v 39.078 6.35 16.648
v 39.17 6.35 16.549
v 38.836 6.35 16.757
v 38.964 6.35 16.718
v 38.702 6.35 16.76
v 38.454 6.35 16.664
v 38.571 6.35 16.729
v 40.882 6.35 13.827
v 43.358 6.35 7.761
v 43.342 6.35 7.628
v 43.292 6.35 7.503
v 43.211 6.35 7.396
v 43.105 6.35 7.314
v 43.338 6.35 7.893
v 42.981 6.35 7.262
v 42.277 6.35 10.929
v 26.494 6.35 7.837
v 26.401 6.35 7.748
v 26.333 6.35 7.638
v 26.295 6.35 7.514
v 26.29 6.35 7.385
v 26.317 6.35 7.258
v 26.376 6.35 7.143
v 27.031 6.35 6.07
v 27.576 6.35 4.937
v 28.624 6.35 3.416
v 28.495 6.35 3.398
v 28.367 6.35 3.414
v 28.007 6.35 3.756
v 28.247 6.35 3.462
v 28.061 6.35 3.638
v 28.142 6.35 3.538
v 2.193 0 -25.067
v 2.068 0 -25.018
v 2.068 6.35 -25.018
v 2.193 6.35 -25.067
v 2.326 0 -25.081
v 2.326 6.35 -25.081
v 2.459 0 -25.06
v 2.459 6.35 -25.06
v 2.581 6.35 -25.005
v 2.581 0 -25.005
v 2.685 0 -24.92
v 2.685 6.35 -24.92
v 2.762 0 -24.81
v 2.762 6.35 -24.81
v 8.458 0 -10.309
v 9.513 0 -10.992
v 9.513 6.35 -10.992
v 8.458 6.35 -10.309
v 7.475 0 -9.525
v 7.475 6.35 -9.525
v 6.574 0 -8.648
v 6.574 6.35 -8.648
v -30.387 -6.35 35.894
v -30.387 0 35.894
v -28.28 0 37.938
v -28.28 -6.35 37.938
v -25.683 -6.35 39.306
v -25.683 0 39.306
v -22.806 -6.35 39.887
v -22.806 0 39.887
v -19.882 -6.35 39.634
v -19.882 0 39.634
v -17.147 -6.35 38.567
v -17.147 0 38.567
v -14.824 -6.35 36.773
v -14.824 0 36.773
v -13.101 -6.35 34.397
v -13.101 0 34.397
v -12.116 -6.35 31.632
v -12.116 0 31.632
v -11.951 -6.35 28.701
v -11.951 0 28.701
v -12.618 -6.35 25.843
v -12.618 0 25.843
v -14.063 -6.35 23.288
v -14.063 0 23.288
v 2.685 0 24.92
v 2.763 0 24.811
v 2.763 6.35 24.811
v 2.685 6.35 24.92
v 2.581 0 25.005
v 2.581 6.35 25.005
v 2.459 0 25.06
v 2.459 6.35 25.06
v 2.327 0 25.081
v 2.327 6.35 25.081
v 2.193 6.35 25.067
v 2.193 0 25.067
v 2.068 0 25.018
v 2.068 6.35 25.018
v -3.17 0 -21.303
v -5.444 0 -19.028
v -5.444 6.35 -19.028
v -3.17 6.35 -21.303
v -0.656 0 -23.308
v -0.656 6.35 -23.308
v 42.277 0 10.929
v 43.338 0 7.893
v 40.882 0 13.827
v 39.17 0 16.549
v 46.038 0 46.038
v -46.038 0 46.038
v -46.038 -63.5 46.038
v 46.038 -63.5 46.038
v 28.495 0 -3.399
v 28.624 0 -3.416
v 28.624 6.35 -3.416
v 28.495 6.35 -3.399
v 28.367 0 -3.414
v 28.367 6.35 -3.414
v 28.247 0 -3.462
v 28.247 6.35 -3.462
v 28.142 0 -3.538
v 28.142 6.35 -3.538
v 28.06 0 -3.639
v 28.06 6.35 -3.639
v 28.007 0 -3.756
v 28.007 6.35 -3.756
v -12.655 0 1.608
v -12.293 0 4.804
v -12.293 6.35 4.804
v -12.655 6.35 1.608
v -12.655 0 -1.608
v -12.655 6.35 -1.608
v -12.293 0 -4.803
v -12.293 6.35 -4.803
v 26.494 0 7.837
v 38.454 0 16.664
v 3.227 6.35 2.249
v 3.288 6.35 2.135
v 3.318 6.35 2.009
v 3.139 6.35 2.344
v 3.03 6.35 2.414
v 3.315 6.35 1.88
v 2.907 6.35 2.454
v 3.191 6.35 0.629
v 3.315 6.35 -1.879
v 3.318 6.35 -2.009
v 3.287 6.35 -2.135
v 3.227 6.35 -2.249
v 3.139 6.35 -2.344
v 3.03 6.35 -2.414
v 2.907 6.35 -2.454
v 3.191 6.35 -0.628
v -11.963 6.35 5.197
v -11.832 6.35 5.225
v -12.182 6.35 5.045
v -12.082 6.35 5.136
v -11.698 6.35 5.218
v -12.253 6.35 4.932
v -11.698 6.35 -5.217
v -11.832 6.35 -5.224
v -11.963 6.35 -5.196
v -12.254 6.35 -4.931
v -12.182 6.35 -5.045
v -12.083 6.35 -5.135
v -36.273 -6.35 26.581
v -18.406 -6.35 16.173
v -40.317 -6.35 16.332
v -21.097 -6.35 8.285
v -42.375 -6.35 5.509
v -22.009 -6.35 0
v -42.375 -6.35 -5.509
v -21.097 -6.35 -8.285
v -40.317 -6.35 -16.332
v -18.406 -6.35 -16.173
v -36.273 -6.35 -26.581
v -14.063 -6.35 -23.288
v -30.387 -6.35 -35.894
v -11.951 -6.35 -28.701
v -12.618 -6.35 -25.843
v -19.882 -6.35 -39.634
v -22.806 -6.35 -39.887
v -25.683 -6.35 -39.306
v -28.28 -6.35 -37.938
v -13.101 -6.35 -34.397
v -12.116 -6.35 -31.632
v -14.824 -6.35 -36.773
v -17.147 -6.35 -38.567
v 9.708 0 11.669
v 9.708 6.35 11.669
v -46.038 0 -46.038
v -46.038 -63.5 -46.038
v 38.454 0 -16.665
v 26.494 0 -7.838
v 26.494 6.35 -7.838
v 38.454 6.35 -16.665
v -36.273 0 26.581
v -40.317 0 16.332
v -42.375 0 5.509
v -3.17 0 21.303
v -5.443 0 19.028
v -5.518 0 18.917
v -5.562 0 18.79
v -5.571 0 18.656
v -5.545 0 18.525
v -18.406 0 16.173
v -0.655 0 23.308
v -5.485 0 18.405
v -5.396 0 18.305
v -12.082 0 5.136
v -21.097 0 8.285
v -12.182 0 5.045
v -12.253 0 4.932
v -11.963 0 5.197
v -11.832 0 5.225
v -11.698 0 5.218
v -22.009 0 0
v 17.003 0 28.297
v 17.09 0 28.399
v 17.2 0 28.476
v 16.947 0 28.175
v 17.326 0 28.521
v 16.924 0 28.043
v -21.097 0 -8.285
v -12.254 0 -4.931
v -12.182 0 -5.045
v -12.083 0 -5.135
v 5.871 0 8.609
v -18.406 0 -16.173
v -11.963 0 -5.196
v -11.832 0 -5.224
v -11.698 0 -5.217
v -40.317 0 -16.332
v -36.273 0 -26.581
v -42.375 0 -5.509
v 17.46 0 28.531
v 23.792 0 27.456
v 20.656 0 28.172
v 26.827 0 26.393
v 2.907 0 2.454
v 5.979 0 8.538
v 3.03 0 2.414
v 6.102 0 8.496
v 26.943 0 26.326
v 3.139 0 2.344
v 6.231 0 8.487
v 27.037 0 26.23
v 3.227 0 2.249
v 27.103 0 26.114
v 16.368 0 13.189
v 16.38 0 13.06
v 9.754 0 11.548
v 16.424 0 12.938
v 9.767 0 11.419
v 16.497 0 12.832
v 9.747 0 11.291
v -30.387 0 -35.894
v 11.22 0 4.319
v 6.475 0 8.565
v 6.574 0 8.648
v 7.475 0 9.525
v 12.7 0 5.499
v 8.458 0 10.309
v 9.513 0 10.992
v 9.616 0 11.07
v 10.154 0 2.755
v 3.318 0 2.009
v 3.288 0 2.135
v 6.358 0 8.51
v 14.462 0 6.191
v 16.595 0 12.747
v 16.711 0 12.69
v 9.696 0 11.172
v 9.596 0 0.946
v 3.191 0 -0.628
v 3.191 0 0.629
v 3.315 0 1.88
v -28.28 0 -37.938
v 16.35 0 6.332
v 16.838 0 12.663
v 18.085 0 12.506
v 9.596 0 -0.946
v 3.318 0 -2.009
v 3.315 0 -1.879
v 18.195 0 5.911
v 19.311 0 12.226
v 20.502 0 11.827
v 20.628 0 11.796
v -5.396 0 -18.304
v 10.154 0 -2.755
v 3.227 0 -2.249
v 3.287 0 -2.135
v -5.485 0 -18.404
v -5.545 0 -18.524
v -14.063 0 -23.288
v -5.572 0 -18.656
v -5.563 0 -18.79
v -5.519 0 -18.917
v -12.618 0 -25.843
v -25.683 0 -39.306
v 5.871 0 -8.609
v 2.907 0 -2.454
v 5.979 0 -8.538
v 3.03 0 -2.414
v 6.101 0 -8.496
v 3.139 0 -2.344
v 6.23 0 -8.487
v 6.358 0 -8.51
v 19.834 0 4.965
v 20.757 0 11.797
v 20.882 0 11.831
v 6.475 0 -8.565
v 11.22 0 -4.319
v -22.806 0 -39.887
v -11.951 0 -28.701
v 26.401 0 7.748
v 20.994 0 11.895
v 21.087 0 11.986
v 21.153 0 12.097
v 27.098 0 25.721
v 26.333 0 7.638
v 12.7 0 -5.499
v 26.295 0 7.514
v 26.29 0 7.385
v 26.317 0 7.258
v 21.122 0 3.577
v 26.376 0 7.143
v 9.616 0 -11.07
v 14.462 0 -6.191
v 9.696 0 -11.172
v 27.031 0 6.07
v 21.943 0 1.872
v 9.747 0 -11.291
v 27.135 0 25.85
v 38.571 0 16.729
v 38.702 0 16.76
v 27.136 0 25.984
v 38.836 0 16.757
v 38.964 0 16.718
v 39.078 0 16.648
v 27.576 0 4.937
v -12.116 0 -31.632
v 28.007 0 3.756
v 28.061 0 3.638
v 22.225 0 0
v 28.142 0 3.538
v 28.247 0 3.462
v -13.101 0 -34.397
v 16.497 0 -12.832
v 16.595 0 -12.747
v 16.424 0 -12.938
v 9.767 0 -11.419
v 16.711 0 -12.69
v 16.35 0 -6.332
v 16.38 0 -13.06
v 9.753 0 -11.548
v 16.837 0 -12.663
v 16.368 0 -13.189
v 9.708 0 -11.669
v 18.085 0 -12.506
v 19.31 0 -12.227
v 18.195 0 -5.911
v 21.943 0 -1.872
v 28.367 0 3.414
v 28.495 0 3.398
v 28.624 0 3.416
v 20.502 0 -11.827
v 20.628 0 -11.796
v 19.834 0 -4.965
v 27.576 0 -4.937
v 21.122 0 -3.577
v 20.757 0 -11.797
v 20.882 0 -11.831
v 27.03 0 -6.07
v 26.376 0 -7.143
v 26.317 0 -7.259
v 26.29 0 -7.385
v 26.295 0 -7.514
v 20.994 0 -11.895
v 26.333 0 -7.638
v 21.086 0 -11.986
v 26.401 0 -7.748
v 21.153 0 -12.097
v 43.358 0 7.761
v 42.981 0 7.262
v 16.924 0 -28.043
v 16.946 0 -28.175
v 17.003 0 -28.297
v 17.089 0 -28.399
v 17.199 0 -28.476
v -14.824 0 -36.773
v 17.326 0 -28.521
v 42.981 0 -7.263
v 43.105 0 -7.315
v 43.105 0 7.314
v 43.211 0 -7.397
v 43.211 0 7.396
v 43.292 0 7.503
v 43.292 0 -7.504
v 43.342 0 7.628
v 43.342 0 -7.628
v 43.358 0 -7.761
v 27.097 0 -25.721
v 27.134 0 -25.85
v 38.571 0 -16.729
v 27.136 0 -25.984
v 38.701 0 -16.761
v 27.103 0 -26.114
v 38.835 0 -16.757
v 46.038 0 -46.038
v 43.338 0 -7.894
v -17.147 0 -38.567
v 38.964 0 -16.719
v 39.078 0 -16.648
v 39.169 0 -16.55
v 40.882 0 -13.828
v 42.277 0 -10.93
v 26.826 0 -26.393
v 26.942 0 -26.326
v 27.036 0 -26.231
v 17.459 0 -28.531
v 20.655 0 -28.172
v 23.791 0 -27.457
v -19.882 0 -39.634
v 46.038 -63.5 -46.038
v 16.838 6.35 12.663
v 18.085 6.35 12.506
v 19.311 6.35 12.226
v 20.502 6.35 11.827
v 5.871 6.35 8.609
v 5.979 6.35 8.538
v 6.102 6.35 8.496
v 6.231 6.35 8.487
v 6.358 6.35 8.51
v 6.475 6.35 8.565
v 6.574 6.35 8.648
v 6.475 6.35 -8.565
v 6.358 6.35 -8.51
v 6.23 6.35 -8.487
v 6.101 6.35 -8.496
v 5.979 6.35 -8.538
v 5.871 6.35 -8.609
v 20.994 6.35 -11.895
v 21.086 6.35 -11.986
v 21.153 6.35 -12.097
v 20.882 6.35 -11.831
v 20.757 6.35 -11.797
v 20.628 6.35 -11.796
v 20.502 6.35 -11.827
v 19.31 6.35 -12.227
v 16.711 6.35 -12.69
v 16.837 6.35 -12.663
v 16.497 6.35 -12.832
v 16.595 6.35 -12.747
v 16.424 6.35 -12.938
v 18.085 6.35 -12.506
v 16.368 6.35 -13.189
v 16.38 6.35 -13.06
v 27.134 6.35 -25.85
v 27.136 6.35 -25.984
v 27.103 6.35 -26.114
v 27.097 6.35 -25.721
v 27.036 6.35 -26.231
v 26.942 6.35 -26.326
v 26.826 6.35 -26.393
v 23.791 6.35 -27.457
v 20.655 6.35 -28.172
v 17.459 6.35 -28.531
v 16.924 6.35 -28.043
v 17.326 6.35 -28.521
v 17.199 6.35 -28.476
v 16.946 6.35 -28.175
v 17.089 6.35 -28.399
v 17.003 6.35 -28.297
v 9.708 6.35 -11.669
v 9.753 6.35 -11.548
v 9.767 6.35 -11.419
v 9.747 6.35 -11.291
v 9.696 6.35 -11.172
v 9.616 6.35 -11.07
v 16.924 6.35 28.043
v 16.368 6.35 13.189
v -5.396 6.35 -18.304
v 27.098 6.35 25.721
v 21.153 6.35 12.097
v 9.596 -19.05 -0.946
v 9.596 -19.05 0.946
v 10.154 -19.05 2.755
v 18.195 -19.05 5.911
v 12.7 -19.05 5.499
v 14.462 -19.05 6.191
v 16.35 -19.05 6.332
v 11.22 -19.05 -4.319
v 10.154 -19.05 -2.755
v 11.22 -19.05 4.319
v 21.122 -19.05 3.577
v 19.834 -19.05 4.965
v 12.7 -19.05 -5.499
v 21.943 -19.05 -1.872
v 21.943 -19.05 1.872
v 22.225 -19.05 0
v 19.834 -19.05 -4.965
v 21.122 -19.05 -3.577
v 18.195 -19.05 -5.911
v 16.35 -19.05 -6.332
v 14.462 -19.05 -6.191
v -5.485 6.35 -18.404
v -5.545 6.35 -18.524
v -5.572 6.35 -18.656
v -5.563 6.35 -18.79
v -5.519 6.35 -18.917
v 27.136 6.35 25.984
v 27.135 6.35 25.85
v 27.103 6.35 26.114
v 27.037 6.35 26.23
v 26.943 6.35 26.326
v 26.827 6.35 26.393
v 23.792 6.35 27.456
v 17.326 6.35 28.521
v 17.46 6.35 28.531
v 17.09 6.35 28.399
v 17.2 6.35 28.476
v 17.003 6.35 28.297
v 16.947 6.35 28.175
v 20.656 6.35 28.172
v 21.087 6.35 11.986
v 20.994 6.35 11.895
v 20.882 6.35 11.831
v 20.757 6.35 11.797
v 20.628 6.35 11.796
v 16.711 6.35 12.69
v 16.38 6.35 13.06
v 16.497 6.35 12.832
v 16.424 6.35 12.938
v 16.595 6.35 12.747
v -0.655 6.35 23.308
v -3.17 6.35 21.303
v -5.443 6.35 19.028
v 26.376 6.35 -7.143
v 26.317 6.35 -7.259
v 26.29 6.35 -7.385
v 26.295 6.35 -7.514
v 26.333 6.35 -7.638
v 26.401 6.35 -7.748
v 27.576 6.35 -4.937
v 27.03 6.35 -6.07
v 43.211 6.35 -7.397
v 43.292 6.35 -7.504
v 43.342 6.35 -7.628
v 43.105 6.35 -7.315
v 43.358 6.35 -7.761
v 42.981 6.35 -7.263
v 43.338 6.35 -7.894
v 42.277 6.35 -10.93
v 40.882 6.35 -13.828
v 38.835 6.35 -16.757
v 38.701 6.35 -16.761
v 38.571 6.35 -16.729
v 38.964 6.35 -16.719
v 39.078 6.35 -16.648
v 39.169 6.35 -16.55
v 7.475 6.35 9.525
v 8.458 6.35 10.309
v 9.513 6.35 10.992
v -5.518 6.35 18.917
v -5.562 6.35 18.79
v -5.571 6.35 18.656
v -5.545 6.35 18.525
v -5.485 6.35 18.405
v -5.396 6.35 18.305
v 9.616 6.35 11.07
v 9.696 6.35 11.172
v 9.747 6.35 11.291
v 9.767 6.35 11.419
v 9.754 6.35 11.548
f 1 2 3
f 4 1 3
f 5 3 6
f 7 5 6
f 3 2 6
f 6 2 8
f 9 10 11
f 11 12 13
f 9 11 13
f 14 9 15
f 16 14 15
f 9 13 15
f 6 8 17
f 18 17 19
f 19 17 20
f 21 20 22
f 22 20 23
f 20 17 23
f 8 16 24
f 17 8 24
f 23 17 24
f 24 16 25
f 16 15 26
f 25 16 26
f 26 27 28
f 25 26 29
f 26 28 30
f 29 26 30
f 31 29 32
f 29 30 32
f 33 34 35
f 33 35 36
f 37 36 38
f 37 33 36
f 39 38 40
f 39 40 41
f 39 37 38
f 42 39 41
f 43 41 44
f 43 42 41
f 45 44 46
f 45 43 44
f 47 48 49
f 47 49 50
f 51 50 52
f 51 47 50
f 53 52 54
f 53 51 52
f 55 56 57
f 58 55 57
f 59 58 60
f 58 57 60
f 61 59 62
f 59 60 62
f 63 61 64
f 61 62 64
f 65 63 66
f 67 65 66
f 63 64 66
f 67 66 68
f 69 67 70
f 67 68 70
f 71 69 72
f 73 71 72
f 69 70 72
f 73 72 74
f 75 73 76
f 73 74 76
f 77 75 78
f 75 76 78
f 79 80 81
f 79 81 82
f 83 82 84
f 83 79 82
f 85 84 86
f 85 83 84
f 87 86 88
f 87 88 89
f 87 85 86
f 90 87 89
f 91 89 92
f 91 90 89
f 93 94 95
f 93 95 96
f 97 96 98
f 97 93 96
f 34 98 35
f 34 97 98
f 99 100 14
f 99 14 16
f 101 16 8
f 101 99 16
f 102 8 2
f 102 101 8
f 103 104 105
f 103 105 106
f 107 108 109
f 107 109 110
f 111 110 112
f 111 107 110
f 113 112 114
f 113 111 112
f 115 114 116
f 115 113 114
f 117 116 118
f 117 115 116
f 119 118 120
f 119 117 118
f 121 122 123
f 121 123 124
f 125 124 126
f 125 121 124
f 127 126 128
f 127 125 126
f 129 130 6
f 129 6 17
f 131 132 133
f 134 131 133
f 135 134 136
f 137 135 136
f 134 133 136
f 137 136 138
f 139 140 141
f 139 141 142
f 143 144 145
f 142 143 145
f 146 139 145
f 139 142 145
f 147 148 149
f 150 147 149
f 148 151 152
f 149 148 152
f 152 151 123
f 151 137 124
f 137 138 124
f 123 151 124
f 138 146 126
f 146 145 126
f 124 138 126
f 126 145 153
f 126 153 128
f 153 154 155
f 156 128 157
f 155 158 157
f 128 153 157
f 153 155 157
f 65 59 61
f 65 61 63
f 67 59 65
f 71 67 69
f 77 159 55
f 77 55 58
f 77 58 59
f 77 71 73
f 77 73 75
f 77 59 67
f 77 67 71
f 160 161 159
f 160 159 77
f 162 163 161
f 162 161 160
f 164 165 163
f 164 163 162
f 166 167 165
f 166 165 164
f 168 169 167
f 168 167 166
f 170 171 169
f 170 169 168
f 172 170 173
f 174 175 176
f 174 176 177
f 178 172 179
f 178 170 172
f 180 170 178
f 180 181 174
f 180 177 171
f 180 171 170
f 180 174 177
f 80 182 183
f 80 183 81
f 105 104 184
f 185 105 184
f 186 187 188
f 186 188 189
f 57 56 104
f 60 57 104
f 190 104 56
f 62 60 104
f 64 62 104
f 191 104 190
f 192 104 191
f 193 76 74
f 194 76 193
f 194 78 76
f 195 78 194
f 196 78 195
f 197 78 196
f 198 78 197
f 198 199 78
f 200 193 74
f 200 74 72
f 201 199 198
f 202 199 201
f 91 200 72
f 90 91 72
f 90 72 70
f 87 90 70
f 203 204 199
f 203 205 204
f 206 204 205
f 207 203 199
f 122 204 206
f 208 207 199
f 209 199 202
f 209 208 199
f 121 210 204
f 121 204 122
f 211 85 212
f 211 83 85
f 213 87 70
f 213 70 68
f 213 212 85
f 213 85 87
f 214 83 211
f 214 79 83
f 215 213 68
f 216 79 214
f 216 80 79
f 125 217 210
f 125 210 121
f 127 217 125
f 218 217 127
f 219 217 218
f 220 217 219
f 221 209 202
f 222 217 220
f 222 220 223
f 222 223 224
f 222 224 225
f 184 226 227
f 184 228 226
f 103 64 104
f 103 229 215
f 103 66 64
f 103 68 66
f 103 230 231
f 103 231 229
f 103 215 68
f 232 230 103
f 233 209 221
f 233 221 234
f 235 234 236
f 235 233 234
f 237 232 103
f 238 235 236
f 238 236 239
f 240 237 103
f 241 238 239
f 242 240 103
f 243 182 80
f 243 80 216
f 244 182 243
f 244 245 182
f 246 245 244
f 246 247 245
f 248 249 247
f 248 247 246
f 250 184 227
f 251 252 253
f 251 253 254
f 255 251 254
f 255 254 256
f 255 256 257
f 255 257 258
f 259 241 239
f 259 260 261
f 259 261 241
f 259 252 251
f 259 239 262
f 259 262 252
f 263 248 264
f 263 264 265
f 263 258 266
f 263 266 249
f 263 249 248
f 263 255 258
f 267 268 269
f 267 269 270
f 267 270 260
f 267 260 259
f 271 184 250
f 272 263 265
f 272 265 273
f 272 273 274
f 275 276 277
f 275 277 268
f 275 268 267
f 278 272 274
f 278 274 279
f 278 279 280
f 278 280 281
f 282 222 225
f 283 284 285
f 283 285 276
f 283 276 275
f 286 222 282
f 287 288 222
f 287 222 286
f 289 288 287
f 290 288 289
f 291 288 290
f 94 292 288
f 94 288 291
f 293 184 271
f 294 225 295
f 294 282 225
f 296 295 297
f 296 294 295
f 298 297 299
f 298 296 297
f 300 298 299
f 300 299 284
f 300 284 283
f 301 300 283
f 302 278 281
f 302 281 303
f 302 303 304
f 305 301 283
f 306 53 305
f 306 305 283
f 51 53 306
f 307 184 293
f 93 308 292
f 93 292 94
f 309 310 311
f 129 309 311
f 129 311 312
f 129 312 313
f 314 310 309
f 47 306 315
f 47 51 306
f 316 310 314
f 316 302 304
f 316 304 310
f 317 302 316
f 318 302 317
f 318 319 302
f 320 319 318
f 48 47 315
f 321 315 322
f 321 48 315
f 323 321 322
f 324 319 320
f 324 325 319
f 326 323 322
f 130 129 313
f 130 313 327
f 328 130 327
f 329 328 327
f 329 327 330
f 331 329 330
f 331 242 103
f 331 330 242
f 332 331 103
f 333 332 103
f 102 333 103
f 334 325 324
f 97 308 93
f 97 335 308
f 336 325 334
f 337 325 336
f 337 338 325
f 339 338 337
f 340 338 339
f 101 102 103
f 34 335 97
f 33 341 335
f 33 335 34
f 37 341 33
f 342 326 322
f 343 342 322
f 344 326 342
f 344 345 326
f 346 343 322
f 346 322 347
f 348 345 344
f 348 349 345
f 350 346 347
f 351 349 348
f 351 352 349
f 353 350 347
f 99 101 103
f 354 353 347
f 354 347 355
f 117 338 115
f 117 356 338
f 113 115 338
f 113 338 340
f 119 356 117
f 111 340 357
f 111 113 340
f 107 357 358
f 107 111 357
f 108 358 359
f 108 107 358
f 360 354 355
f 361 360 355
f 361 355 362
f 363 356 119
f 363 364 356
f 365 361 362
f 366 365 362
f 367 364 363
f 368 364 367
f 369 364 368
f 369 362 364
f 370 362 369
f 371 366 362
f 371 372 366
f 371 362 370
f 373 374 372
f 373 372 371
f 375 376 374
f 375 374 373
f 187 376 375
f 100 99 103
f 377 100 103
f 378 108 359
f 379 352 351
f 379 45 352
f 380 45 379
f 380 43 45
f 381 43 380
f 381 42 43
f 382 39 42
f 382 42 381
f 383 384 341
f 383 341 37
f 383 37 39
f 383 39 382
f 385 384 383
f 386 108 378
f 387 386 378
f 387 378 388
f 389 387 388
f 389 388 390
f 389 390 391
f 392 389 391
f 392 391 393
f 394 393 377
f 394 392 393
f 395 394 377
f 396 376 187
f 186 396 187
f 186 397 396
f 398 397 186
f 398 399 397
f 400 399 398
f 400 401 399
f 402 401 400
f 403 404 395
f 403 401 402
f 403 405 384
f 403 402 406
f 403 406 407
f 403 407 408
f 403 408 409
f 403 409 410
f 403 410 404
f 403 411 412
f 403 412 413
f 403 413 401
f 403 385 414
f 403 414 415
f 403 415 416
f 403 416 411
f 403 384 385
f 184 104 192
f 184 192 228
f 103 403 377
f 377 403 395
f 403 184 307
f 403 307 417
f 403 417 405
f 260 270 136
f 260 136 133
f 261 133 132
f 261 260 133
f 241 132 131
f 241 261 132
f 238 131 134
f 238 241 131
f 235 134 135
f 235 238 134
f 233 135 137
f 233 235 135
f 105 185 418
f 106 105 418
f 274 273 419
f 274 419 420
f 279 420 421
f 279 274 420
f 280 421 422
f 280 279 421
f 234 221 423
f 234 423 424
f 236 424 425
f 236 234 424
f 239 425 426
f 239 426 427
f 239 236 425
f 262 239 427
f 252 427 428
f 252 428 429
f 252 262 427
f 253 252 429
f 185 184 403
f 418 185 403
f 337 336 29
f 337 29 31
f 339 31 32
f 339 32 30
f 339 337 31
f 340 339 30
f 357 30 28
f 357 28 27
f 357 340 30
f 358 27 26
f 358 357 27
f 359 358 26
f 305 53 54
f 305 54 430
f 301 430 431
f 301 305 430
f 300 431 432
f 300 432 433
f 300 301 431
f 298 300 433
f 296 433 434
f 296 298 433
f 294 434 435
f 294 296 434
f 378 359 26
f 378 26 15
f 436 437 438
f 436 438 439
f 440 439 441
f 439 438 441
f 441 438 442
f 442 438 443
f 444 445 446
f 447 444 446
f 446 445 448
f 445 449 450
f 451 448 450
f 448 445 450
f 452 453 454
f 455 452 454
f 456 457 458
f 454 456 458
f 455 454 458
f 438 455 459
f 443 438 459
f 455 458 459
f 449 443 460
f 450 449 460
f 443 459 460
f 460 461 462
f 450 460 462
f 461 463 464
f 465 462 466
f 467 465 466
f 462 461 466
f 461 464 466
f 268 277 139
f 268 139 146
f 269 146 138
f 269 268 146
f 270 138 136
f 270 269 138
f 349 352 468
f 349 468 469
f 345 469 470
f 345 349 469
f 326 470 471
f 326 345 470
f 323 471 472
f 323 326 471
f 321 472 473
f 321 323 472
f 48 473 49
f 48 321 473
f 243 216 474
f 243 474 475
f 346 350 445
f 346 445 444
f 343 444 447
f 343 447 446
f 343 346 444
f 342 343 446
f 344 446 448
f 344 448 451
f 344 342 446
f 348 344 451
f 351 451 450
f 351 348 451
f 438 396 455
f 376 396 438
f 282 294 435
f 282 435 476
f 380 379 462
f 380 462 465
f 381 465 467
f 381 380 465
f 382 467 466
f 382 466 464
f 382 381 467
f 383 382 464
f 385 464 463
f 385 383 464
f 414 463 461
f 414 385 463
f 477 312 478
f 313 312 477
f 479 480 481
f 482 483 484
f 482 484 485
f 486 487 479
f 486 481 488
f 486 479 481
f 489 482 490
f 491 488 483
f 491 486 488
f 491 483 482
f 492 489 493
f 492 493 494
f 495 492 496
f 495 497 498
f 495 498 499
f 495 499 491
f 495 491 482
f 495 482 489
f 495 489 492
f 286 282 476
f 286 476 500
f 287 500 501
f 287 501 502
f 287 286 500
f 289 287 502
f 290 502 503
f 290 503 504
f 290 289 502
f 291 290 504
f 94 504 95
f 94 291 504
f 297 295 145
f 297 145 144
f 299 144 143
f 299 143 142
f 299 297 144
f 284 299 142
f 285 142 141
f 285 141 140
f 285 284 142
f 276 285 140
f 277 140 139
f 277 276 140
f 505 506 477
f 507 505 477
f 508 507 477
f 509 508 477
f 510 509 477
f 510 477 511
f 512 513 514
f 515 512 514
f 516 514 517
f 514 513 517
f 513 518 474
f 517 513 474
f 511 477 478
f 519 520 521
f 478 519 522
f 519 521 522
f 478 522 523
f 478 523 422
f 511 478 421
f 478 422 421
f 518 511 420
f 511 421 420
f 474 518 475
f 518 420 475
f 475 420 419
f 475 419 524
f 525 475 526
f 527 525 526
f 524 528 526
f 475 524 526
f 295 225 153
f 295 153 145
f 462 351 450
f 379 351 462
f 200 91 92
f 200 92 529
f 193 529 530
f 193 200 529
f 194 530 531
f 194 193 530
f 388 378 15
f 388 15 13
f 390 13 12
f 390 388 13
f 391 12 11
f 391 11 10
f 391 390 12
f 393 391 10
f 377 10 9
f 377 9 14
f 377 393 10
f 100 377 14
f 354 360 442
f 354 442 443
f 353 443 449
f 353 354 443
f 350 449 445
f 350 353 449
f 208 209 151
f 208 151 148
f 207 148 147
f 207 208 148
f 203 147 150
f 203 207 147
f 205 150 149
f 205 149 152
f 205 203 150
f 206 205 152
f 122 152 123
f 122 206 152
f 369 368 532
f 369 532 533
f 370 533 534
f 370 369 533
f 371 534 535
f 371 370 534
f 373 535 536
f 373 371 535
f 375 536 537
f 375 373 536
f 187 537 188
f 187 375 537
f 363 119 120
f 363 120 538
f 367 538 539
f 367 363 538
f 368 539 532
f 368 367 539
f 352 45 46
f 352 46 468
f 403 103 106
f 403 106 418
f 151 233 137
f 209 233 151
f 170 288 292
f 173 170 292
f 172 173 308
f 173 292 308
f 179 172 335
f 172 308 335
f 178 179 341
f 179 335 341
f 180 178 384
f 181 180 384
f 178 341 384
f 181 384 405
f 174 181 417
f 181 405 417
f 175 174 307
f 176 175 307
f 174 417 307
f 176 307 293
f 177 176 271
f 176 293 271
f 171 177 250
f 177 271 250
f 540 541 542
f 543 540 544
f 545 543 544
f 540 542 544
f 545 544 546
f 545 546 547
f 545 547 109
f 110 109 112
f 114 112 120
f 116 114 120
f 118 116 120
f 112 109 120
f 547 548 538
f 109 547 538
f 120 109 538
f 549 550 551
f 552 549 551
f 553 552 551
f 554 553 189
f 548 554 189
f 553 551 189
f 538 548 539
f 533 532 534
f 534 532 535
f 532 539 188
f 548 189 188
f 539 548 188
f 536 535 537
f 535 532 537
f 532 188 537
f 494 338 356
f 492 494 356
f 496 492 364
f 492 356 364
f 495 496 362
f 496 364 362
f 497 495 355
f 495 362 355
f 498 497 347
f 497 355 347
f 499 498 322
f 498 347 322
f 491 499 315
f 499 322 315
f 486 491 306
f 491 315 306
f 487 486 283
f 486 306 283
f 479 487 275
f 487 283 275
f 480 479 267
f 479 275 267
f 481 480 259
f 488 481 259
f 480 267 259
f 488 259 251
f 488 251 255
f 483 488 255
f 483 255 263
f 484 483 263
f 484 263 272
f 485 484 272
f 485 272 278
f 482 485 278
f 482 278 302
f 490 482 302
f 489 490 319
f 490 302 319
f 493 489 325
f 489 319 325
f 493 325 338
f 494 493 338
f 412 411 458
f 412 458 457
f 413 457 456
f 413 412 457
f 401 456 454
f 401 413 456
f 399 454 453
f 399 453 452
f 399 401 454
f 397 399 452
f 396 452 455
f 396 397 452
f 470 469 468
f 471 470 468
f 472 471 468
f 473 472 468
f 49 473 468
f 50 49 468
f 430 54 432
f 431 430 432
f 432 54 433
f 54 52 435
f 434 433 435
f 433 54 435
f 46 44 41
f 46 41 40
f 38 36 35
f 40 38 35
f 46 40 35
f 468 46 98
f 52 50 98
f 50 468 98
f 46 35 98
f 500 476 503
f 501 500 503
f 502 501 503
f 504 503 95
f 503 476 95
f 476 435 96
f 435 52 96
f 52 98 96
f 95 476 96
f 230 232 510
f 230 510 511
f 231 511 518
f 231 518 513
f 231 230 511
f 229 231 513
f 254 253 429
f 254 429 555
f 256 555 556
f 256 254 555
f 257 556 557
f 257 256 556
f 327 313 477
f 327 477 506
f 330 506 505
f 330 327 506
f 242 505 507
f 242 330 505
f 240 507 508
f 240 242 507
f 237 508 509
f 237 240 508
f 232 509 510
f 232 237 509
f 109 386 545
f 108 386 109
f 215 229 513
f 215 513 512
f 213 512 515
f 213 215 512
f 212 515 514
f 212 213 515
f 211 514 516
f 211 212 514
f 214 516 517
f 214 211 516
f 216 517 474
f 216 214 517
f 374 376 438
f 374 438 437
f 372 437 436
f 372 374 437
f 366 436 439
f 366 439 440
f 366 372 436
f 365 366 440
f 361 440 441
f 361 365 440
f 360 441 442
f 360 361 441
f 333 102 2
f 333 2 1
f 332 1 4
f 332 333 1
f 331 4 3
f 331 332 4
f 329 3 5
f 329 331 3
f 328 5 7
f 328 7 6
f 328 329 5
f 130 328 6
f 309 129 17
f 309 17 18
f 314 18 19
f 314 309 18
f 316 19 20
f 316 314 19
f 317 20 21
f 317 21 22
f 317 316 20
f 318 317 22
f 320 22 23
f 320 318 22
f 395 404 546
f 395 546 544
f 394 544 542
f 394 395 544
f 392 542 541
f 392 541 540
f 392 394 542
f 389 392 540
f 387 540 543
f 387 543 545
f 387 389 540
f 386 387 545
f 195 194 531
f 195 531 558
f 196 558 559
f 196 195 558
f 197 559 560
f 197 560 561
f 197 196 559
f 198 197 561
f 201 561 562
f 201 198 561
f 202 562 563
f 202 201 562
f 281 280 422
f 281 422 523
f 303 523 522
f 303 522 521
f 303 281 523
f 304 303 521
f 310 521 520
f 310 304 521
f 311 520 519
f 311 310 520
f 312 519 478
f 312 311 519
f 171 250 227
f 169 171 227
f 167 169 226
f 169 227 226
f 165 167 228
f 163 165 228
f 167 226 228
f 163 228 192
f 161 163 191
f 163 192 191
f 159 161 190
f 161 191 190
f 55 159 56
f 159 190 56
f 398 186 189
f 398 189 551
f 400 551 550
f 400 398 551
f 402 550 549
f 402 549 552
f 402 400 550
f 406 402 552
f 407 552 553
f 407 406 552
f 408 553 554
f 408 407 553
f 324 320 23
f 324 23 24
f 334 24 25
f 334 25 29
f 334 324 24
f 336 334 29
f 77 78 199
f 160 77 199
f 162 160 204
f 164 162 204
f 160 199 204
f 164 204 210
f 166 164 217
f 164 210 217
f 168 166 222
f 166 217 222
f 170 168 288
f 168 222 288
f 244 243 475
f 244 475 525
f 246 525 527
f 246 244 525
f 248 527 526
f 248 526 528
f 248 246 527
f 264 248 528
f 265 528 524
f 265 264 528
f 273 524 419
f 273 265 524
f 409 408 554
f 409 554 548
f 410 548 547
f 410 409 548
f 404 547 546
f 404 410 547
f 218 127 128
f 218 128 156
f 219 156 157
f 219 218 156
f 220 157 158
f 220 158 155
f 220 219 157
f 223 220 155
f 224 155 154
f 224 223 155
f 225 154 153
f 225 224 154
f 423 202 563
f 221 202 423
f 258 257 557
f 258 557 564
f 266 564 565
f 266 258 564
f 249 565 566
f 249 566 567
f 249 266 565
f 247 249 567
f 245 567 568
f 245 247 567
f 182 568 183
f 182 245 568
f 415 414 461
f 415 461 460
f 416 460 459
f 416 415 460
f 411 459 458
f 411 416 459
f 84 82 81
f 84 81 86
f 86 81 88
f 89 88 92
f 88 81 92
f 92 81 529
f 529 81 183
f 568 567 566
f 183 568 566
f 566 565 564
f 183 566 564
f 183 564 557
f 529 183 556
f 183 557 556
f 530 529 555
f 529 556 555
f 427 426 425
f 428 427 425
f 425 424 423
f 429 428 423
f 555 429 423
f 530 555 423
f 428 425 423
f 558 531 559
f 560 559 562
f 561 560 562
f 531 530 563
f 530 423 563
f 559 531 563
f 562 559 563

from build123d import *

# Parameters (mm, degrees)
SKETCH1_W           = 92.075
SKETCH1_H           = 92.075
BOSS_EXTRUDE1_DEPTH = 63.5
CUT_EXTRUDE1_DEPTH  = 6.35
BOSS_EXTRUDE2_DEPTH = 6.35
SKETCH5_R           = 6.35
CUT_EXTRUDE2_DEPTH  = 19.05


with BuildPart() as part:
    # Sketch1 → Boss-Extrude1 (new body)
    with BuildSketch(Plane(origin=(0, 0, 0), x_dir=(1, 0, 0), z_dir=(0, 1, 0))):
        Rectangle(SKETCH1_W, SKETCH1_H)
    extrude(amount=-BOSS_EXTRUDE1_DEPTH)

    # Sketch3 → Cut-Extrude1 (cut)
    with BuildSketch(Plane(origin=(0, 0, 0), x_dir=(1, 0, 0), z_dir=(0, 1, 0))):
        with BuildLine():
            ThreePointArc((-14.063201547, 23.287775446), (-15.921775446, 37.752798453), (-30.386798453, 35.894224554))
            ThreePointArc((-30.386798453, 35.894224554), (-42.633573767, 0), (-30.386798453, -35.894224554))
            ThreePointArc((-30.386798453, -35.894224554), (-15.921775446, -37.752798453), (-14.063201547, -23.287775446))
            ThreePointArc((-14.063201547, -23.287775446), (-22.008773767, 0), (-14.063201547, 23.287775446))
        make_face()
    extrude(amount=-CUT_EXTRUDE1_DEPTH, mode=Mode.SUBTRACT)

    # Sketch4 → Boss-Extrude2 (add)
    with BuildSketch(Plane(origin=(0, 0, 0), x_dir=(1, 0, 0), z_dir=(0, 1, 0))):
        with BuildLine():
            Line((42.981199166, 7.263084177), (28.623508469, 3.415952549))
            ThreePointArc((28.623508469, 3.415952549), (28.246537351, 3.461897832), (28.006758071, 3.756387374))
            ThreePointArc((28.006758071, 3.756387374), (27.317235926, 5.510466133), (26.375711245, 7.143182998))
            ThreePointArc((26.375711245, 7.143182998), (26.294960734, 7.5142592), (26.49406885, 7.837638468))
            Line((26.49406885, 7.837638468), (38.453531121, 16.664583926))
            ThreePointArc((38.453531121, 16.664583926), (38.835445953, 16.757478046), (39.169323269, 16.550079409))
            ThreePointArc((39.169323269, 16.550079409), (41.620030834, 12.3985488), (43.337949301, 7.894114306))
            ThreePointArc((43.337949301, 7.894114306), (43.291940716, 7.503766427), (42.981199166, 7.263084177))
        make_face()
        with BuildLine():
            Line((27.096930878, 25.720938792), (21.152865774, 12.096996853))
            ThreePointArc((21.152865774, 12.096996853), (20.881906657, 11.830915381), (20.502165527, 11.827059617))
            ThreePointArc((20.502165527, 11.827059617), (18.700861504, 12.381619715), (16.837321021, 12.663488392))
            ThreePointArc((16.837321021, 12.663488392), (16.496854843, 12.831717328), (16.368168631, 13.189009997))
            Line((16.368168631, 13.189009997), (16.923587539, 28.042804588))
            ThreePointArc((16.923587539, 28.042804588), (17.089079994, 28.399316164), (17.45939988, 28.531041026))
            ThreePointArc((17.45939988, 28.531041026), (22.233188385, 27.858644358), (26.826001728, 26.39329813))
            ThreePointArc((26.826001728, 26.39329813), (27.102502105, 26.113949248), (27.096930878, 25.720938792))
        make_face()
        with BuildLine():
            Line((2.762319753, 24.810401886), (9.707882502, 11.668755794))
            ThreePointArc((9.707882502, 11.668755794), (9.746973129, 11.291012341), (9.513222964, 10.991714741))
            ThreePointArc((9.513222964, 10.991714741), (7.956555733, 9.929161112), (6.57428344, 8.647928739))
            ThreePointArc((6.57428344, 8.647928739), (6.230479572, 8.486630588), (5.870902373, 8.608787991))
            Line((5.870902373, 8.608787991), (-5.395963847, 18.304221426))
            ThreePointArc((-5.395963847, 18.304221426), (-5.571512963, 18.65588997), (-5.443608935, 19.027546823))
            ThreePointArc((-5.443608935, 19.027546823), (-1.941499602, 22.340612501), (2.067726493, 25.017790136))
            ThreePointArc((2.067726493, 25.017790136), (2.458525409, 25.059795657), (2.762319753, 24.810401886))
        make_face()
        with BuildLine():
            Line((-11.698175696, 5.21712632), (2.906864493, 2.453703622))
            ThreePointArc((2.906864493, 2.453703622), (3.226568823, 2.248746714), (3.314828266, 1.879384474))
            ThreePointArc((3.314828266, 1.879384474), (3.175000001, -0.000158326), (3.314875129, -1.87969764))
            ThreePointArc((3.314875129, -1.87969764), (3.226624896, -2.24906208), (2.906925676, -2.454026959))
            Line((2.906925676, -2.454026959), (-11.698045607, -5.217813808))
            ThreePointArc((-11.698045607, -5.217813808), (-12.08244423, -5.135801882), (-12.293270401, -4.804078229))
            ThreePointArc((-12.293270401, -4.804078229), (-12.699999998, -0.000356234), (-12.293390173, 4.803375901))
            ThreePointArc((-12.293390173, 4.803375901), (-12.082572273, 5.13510481), (-11.698175696, 5.21712632))
        make_face()
        with BuildLine():
            Line((-5.395507456, -18.304751776), (5.871117022, -8.609037424))
            ThreePointArc((5.871117022, -8.609037424), (6.230691175, -8.486871055), (6.574499064, -8.648160634))
            ThreePointArc((6.574499064, -8.648160634), (7.956803301, -9.929358541), (9.513497025, -10.991873357))
            ThreePointArc((9.513497025, -10.991873357), (9.747254652, -11.291165129), (9.708173444, -11.668909556))
            Line((9.708173444, -11.668909556), (2.762938362, -24.81072882))
            ThreePointArc((2.762938362, -24.81072882), (2.459150236, -25.060130166), (2.068350273, -25.018134389))
            ThreePointArc((2.068350273, -25.018134389), (-1.940942572, -22.341056718), (-5.443134509, -19.02807836))
            ThreePointArc((-5.443134509, -19.02807836), (-5.571047804, -18.656424696), (-5.395507456, -18.304751776))
        make_face()
        with BuildLine():
            Line((16.924286738, -28.042778435), (16.368497476, -13.188997697))
            ThreePointArc((16.368497476, -13.188997697), (16.49717478, -12.831701819), (16.837636763, -12.663464394))
            ThreePointArc((16.837636763, -12.663464394), (18.701170218, -12.381549253), (20.502460413, -11.826944243))
            ThreePointArc((20.502460413, -11.826944243), (20.882201639, -11.830790538), (21.15316739, -12.096865255))
            Line((21.15316739, -12.096865255), (27.097572182, -25.720658985))
            ThreePointArc((27.097572182, -25.720658985), (27.103153208, -26.113669301), (26.826659795, -26.393025077))
            ThreePointArc((26.826659795, -26.393025077), (22.23388299, -27.858485819), (17.460111251, -28.531001513))
            ThreePointArc((17.460111251, -28.531001513), (17.089788082, -28.399285884), (16.924286738, -28.042778435))
        make_face()
        with BuildLine():
            Line((38.453946616, -16.664020964), (26.494264265, -7.837373698))
            ThreePointArc((26.494264265, -7.837373698), (26.295148086, -7.513999394), (26.375889345, -7.142921178))
            ThreePointArc((26.375889345, -7.142921178), (27.317373317, -5.510180839), (28.006851726, -3.756084888))
            ThreePointArc((28.006851726, -3.756084888), (28.246623663, -3.461589368), (28.623593636, -3.415634686))
            Line((28.623593636, -3.415634686), (42.98138025, -7.262408328))
            ThreePointArc((42.98138025, -7.262408328), (43.292127801, -7.503082831), (43.338146119, -7.893429562))
            ThreePointArc((43.338146119, -7.893429562), (41.620339963, -12.397906888), (39.169735909, -16.549498601))
            ThreePointArc((39.169735909, -16.549498601), (38.835863765, -16.756905562), (38.453946616, -16.664020964))
        make_face()
    extrude(amount=BOSS_EXTRUDE2_DEPTH)

    # Sketch5 → Cut-Extrude2 (cut)
    with BuildSketch(Plane(origin=(0, 0, 0), x_dir=(1, 0, 0), z_dir=(0, 1, 0))):
        with Locations((15.875, 0)):
            Circle(SKETCH5_R)
    extrude(amount=-CUT_EXTRUDE2_DEPTH, mode=Mode.SUBTRACT)


solid = part.part
